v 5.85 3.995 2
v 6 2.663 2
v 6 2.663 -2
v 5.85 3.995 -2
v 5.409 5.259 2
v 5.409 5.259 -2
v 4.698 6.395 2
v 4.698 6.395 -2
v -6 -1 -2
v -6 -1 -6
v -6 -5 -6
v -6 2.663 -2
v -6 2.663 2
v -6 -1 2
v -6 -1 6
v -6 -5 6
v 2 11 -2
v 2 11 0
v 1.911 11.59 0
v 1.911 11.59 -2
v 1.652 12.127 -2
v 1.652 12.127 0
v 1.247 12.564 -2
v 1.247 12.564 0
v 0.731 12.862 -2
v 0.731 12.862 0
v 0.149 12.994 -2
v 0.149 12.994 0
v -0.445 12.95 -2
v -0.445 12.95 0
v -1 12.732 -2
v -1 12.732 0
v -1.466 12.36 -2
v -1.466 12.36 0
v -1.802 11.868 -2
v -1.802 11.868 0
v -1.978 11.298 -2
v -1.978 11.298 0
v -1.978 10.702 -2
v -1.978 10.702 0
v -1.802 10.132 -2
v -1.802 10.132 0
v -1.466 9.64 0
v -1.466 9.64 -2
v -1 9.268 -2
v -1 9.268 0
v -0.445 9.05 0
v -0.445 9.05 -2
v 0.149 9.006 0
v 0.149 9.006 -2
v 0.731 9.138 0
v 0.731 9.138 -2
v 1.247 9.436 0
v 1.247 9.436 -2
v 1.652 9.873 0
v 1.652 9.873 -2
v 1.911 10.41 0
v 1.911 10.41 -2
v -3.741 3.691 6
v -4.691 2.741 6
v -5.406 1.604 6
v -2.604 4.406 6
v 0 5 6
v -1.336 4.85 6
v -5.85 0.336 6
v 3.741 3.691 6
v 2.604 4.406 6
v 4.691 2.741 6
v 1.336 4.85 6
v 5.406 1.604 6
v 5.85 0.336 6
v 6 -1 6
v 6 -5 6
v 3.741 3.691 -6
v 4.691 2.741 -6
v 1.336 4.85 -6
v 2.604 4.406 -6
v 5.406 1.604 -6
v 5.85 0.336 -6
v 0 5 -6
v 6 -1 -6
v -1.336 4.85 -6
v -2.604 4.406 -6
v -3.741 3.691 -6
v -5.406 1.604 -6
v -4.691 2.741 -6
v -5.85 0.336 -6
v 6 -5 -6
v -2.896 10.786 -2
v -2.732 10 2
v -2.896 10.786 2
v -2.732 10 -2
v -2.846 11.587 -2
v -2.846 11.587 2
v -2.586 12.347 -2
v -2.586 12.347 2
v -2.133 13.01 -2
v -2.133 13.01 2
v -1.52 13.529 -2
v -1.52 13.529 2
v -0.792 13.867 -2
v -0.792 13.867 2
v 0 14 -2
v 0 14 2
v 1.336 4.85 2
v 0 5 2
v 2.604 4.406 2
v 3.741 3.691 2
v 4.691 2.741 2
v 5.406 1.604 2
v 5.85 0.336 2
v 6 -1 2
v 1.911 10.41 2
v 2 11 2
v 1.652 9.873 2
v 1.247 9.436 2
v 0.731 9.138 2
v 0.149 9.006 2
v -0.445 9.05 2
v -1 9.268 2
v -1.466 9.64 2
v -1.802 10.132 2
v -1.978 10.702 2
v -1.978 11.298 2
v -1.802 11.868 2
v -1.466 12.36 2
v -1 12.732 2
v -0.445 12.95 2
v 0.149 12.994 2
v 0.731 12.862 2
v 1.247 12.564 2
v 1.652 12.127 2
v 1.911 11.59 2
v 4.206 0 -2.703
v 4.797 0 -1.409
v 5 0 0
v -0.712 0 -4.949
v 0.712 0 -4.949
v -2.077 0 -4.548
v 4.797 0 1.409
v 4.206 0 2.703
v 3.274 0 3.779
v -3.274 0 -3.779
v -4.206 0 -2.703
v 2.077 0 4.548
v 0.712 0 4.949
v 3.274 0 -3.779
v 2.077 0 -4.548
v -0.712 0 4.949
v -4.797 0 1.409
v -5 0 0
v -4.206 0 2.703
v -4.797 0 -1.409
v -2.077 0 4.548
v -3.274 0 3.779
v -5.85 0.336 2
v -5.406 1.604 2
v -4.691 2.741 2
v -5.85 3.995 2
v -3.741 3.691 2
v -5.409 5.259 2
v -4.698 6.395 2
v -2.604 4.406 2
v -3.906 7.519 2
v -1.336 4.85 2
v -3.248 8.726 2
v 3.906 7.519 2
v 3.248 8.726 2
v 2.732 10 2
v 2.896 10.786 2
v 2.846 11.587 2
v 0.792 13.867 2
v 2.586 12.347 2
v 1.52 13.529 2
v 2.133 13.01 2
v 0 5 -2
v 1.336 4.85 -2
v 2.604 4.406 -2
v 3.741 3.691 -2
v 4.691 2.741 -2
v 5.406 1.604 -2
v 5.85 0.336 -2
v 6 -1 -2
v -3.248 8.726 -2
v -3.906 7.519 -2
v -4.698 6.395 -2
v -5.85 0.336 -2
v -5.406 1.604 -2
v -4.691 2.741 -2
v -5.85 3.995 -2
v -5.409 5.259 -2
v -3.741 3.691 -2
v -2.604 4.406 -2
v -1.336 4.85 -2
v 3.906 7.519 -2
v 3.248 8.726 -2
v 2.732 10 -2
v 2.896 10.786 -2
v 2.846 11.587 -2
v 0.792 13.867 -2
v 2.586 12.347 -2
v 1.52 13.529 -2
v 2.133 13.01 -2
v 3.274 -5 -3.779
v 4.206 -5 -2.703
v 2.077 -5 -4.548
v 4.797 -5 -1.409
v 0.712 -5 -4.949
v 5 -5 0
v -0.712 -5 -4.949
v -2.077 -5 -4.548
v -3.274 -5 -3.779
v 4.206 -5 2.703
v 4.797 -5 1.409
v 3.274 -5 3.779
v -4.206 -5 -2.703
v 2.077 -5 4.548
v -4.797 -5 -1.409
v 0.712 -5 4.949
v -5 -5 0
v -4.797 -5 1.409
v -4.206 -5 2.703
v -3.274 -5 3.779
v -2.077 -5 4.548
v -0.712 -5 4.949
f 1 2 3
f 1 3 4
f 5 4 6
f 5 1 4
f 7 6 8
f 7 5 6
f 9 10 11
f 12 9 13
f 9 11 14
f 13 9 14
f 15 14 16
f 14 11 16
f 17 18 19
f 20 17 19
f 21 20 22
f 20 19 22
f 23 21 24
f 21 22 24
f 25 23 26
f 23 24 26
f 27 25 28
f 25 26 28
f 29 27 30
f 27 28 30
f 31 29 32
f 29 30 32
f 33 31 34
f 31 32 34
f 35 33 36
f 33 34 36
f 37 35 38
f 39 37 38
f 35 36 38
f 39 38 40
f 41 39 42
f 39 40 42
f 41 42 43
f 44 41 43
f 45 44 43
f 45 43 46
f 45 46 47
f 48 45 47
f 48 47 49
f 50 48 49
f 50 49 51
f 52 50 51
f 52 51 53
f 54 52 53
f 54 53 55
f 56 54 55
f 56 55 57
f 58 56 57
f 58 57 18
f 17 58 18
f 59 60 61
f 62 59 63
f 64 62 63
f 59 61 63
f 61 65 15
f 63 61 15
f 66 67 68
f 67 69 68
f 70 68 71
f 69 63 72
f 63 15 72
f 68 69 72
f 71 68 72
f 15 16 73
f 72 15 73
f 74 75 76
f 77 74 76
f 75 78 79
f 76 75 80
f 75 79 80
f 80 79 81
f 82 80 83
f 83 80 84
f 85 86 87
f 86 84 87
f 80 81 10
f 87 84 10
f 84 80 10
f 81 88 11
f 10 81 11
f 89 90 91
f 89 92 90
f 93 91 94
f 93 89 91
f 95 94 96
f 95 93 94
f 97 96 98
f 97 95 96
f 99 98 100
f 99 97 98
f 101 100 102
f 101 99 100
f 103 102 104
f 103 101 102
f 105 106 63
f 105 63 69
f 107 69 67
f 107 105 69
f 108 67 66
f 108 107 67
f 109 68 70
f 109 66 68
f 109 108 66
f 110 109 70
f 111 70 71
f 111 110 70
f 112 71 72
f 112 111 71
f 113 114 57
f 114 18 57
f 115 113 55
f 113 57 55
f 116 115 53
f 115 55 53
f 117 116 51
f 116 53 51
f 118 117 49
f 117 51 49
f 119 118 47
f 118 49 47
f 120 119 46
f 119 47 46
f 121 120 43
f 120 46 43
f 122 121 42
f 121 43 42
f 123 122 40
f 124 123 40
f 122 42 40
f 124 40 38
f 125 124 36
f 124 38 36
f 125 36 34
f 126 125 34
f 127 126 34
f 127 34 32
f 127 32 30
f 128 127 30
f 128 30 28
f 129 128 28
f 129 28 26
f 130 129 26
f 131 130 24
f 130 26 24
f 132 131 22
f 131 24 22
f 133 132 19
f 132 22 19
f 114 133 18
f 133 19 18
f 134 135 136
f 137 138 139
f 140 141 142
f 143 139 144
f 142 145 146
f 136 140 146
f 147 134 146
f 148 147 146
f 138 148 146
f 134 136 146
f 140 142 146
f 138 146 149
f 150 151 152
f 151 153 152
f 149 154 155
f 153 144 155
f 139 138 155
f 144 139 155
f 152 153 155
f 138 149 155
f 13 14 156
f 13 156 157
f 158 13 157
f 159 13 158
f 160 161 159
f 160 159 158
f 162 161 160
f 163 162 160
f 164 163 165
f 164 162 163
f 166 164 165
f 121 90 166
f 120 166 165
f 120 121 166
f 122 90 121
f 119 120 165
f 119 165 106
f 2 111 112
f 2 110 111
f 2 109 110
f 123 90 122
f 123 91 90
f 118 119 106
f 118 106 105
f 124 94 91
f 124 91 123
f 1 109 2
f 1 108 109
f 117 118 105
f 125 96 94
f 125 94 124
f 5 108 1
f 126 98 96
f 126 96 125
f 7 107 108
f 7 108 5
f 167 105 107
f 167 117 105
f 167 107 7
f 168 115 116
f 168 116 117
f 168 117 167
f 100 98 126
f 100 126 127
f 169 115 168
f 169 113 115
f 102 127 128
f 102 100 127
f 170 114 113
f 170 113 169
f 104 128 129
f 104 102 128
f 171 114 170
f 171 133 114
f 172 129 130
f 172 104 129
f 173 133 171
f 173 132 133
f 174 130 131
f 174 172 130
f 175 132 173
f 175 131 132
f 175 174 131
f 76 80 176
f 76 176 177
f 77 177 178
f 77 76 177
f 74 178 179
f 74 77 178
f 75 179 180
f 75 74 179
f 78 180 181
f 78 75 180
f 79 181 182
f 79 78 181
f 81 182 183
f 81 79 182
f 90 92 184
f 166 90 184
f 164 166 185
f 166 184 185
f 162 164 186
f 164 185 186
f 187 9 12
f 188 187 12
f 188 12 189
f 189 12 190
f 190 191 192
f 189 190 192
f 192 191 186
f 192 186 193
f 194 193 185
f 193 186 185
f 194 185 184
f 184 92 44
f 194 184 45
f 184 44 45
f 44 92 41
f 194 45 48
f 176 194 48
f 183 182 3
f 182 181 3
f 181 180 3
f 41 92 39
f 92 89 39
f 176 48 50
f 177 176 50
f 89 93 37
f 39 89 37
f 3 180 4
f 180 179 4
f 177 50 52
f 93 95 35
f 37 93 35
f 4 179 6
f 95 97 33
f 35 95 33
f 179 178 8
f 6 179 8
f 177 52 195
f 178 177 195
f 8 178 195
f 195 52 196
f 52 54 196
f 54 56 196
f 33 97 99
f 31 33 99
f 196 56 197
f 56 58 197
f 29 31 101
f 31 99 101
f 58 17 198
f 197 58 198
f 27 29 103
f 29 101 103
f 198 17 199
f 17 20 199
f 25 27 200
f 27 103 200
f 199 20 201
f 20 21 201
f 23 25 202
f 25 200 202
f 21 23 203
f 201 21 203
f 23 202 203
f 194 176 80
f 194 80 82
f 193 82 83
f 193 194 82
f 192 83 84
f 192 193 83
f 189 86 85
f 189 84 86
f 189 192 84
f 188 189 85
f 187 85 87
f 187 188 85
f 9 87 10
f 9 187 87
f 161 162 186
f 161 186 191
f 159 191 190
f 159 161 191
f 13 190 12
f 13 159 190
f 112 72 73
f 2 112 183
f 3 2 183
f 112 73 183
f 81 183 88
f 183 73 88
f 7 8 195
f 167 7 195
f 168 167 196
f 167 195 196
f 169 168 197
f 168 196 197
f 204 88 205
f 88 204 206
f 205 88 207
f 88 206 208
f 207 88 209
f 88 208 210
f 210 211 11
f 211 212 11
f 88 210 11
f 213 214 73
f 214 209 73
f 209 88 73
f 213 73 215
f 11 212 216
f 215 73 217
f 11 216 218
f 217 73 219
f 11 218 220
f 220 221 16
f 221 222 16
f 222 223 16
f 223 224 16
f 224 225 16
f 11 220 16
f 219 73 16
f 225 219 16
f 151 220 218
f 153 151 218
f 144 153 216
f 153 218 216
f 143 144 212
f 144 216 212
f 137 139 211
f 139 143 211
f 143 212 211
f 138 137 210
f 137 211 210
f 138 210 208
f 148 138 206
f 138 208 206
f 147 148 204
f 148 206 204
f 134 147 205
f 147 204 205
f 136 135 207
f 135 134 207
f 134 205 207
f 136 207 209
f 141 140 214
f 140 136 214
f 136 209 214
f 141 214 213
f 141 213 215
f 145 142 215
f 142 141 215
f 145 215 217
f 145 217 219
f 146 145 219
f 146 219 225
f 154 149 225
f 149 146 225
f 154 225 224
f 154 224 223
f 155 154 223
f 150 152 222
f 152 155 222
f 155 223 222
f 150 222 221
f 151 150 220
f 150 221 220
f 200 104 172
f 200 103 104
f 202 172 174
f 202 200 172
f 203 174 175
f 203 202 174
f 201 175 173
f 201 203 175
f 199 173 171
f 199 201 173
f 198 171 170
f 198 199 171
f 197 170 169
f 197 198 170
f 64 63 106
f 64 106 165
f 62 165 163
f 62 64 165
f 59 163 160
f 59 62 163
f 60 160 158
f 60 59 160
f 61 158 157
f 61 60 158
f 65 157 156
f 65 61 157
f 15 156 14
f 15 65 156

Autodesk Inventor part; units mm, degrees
ref_plane "YZ Plane" through (0, 0, 0) normal (1, 0, 0) x (0, 1, 0)
ref_plane "XZ Plane" through (0, 0, 0) normal (0, 1, 0) x (-1, 0, 0)
sketch "Szkic3" plane through (0, 0, 0) normal (0, 1, 0) x (-1, 0, 0)
  circle A0 centre (0, 0) radius 5
  line L0 (-6, -6) -> (6, -6)
  line L1 (6, -6) -> (6, 6)
  line L2 (6, 6) -> (-6, 6)
  line L3 (-6, 6) -> (-6, -6)
  line L4 (-6, -6) -> (6, 6) construction
  line L5 (6, -6) -> (-6, 6) construction
  dimension "d12" = 10
  dimension "d15" = 12
  dimension "d16" = 12
extrude "Wyciągnięcie proste3" add sketch "Szkic3" along normal mid plane 10
extrude "Wyciągnięcie proste4" add sketch "Szkic3" along normal blind 5 contours A0
ref_plane "Płaszczyzna konstrukcyjna2" through (-6, 5, 0) normal (0, 0, 1) x (1, 0, 0)
sketch "Szkic7" plane through (-6, 5, 0) normal (0, 0, 1) x (1, 0, 0)
  line L0 (0, 0) -> (12, 0) projected
  line L1 (0, 0) -> (12, 0)
  line L2 (6, 0) -> (6, 6)
  line L3 (6, 0) -> (12, 0) construction
  circle A0 centre (6, 6) radius 2
  line L4 (4.2679, 5) -> (3.2679, 5)
  line L5 (6, 8) -> (6, 9)
  line L6 (7.7321, 5) -> (8.7321, 5)
  arc A1 (0, 0) -> (3.2679, 5) centre (-8.0948, 8.8586) ccw
  arc A2 (6, 9) -> (3.2679, 5) centre (6.0958, 6.0015) ccw
  arc A3 (8.7321, 5) -> (6, 9) centre (5.9042, 6.0015) ccw
  arc A4 (8.7321, 5) -> (12, 0) centre (20.0948, 8.8586) ccw
  point P0 (6, -5)
  dimension "d42" = 6
  dimension "d43" = 90
  dimension "d44" = 4
  dimension "d45" = 1
  dimension "d46" = 1
  dimension "d47" = 1
  dimension "d48" = 5
  dimension "d49" = 5
  dimension "d50" = 0
  dimension "d51" = 12
  dimension "d52" = 3
  dimension "d53" = 3
  dimension "d54" = 12
extrude "Wyciągnięcie proste7" add sketch "Szkic7" along normal mid plane 4 contours A1 L4 A0 L2 L0 | L2 A0 L6 A4 L0 | A2 L5 A0 L4 | A3 L6 A0 L5
fillet "Zaokrąglenie5" radius 6 4 edges at (-6, 5, 4) (6, 5, 4) (6, 5, -4) (-6, 5, -4)
fillet "Zaokrąglenie6" radius 6 2 edges at (6, 5, 0) (-6, 5, 0)
properties part number "Connector_fill"
